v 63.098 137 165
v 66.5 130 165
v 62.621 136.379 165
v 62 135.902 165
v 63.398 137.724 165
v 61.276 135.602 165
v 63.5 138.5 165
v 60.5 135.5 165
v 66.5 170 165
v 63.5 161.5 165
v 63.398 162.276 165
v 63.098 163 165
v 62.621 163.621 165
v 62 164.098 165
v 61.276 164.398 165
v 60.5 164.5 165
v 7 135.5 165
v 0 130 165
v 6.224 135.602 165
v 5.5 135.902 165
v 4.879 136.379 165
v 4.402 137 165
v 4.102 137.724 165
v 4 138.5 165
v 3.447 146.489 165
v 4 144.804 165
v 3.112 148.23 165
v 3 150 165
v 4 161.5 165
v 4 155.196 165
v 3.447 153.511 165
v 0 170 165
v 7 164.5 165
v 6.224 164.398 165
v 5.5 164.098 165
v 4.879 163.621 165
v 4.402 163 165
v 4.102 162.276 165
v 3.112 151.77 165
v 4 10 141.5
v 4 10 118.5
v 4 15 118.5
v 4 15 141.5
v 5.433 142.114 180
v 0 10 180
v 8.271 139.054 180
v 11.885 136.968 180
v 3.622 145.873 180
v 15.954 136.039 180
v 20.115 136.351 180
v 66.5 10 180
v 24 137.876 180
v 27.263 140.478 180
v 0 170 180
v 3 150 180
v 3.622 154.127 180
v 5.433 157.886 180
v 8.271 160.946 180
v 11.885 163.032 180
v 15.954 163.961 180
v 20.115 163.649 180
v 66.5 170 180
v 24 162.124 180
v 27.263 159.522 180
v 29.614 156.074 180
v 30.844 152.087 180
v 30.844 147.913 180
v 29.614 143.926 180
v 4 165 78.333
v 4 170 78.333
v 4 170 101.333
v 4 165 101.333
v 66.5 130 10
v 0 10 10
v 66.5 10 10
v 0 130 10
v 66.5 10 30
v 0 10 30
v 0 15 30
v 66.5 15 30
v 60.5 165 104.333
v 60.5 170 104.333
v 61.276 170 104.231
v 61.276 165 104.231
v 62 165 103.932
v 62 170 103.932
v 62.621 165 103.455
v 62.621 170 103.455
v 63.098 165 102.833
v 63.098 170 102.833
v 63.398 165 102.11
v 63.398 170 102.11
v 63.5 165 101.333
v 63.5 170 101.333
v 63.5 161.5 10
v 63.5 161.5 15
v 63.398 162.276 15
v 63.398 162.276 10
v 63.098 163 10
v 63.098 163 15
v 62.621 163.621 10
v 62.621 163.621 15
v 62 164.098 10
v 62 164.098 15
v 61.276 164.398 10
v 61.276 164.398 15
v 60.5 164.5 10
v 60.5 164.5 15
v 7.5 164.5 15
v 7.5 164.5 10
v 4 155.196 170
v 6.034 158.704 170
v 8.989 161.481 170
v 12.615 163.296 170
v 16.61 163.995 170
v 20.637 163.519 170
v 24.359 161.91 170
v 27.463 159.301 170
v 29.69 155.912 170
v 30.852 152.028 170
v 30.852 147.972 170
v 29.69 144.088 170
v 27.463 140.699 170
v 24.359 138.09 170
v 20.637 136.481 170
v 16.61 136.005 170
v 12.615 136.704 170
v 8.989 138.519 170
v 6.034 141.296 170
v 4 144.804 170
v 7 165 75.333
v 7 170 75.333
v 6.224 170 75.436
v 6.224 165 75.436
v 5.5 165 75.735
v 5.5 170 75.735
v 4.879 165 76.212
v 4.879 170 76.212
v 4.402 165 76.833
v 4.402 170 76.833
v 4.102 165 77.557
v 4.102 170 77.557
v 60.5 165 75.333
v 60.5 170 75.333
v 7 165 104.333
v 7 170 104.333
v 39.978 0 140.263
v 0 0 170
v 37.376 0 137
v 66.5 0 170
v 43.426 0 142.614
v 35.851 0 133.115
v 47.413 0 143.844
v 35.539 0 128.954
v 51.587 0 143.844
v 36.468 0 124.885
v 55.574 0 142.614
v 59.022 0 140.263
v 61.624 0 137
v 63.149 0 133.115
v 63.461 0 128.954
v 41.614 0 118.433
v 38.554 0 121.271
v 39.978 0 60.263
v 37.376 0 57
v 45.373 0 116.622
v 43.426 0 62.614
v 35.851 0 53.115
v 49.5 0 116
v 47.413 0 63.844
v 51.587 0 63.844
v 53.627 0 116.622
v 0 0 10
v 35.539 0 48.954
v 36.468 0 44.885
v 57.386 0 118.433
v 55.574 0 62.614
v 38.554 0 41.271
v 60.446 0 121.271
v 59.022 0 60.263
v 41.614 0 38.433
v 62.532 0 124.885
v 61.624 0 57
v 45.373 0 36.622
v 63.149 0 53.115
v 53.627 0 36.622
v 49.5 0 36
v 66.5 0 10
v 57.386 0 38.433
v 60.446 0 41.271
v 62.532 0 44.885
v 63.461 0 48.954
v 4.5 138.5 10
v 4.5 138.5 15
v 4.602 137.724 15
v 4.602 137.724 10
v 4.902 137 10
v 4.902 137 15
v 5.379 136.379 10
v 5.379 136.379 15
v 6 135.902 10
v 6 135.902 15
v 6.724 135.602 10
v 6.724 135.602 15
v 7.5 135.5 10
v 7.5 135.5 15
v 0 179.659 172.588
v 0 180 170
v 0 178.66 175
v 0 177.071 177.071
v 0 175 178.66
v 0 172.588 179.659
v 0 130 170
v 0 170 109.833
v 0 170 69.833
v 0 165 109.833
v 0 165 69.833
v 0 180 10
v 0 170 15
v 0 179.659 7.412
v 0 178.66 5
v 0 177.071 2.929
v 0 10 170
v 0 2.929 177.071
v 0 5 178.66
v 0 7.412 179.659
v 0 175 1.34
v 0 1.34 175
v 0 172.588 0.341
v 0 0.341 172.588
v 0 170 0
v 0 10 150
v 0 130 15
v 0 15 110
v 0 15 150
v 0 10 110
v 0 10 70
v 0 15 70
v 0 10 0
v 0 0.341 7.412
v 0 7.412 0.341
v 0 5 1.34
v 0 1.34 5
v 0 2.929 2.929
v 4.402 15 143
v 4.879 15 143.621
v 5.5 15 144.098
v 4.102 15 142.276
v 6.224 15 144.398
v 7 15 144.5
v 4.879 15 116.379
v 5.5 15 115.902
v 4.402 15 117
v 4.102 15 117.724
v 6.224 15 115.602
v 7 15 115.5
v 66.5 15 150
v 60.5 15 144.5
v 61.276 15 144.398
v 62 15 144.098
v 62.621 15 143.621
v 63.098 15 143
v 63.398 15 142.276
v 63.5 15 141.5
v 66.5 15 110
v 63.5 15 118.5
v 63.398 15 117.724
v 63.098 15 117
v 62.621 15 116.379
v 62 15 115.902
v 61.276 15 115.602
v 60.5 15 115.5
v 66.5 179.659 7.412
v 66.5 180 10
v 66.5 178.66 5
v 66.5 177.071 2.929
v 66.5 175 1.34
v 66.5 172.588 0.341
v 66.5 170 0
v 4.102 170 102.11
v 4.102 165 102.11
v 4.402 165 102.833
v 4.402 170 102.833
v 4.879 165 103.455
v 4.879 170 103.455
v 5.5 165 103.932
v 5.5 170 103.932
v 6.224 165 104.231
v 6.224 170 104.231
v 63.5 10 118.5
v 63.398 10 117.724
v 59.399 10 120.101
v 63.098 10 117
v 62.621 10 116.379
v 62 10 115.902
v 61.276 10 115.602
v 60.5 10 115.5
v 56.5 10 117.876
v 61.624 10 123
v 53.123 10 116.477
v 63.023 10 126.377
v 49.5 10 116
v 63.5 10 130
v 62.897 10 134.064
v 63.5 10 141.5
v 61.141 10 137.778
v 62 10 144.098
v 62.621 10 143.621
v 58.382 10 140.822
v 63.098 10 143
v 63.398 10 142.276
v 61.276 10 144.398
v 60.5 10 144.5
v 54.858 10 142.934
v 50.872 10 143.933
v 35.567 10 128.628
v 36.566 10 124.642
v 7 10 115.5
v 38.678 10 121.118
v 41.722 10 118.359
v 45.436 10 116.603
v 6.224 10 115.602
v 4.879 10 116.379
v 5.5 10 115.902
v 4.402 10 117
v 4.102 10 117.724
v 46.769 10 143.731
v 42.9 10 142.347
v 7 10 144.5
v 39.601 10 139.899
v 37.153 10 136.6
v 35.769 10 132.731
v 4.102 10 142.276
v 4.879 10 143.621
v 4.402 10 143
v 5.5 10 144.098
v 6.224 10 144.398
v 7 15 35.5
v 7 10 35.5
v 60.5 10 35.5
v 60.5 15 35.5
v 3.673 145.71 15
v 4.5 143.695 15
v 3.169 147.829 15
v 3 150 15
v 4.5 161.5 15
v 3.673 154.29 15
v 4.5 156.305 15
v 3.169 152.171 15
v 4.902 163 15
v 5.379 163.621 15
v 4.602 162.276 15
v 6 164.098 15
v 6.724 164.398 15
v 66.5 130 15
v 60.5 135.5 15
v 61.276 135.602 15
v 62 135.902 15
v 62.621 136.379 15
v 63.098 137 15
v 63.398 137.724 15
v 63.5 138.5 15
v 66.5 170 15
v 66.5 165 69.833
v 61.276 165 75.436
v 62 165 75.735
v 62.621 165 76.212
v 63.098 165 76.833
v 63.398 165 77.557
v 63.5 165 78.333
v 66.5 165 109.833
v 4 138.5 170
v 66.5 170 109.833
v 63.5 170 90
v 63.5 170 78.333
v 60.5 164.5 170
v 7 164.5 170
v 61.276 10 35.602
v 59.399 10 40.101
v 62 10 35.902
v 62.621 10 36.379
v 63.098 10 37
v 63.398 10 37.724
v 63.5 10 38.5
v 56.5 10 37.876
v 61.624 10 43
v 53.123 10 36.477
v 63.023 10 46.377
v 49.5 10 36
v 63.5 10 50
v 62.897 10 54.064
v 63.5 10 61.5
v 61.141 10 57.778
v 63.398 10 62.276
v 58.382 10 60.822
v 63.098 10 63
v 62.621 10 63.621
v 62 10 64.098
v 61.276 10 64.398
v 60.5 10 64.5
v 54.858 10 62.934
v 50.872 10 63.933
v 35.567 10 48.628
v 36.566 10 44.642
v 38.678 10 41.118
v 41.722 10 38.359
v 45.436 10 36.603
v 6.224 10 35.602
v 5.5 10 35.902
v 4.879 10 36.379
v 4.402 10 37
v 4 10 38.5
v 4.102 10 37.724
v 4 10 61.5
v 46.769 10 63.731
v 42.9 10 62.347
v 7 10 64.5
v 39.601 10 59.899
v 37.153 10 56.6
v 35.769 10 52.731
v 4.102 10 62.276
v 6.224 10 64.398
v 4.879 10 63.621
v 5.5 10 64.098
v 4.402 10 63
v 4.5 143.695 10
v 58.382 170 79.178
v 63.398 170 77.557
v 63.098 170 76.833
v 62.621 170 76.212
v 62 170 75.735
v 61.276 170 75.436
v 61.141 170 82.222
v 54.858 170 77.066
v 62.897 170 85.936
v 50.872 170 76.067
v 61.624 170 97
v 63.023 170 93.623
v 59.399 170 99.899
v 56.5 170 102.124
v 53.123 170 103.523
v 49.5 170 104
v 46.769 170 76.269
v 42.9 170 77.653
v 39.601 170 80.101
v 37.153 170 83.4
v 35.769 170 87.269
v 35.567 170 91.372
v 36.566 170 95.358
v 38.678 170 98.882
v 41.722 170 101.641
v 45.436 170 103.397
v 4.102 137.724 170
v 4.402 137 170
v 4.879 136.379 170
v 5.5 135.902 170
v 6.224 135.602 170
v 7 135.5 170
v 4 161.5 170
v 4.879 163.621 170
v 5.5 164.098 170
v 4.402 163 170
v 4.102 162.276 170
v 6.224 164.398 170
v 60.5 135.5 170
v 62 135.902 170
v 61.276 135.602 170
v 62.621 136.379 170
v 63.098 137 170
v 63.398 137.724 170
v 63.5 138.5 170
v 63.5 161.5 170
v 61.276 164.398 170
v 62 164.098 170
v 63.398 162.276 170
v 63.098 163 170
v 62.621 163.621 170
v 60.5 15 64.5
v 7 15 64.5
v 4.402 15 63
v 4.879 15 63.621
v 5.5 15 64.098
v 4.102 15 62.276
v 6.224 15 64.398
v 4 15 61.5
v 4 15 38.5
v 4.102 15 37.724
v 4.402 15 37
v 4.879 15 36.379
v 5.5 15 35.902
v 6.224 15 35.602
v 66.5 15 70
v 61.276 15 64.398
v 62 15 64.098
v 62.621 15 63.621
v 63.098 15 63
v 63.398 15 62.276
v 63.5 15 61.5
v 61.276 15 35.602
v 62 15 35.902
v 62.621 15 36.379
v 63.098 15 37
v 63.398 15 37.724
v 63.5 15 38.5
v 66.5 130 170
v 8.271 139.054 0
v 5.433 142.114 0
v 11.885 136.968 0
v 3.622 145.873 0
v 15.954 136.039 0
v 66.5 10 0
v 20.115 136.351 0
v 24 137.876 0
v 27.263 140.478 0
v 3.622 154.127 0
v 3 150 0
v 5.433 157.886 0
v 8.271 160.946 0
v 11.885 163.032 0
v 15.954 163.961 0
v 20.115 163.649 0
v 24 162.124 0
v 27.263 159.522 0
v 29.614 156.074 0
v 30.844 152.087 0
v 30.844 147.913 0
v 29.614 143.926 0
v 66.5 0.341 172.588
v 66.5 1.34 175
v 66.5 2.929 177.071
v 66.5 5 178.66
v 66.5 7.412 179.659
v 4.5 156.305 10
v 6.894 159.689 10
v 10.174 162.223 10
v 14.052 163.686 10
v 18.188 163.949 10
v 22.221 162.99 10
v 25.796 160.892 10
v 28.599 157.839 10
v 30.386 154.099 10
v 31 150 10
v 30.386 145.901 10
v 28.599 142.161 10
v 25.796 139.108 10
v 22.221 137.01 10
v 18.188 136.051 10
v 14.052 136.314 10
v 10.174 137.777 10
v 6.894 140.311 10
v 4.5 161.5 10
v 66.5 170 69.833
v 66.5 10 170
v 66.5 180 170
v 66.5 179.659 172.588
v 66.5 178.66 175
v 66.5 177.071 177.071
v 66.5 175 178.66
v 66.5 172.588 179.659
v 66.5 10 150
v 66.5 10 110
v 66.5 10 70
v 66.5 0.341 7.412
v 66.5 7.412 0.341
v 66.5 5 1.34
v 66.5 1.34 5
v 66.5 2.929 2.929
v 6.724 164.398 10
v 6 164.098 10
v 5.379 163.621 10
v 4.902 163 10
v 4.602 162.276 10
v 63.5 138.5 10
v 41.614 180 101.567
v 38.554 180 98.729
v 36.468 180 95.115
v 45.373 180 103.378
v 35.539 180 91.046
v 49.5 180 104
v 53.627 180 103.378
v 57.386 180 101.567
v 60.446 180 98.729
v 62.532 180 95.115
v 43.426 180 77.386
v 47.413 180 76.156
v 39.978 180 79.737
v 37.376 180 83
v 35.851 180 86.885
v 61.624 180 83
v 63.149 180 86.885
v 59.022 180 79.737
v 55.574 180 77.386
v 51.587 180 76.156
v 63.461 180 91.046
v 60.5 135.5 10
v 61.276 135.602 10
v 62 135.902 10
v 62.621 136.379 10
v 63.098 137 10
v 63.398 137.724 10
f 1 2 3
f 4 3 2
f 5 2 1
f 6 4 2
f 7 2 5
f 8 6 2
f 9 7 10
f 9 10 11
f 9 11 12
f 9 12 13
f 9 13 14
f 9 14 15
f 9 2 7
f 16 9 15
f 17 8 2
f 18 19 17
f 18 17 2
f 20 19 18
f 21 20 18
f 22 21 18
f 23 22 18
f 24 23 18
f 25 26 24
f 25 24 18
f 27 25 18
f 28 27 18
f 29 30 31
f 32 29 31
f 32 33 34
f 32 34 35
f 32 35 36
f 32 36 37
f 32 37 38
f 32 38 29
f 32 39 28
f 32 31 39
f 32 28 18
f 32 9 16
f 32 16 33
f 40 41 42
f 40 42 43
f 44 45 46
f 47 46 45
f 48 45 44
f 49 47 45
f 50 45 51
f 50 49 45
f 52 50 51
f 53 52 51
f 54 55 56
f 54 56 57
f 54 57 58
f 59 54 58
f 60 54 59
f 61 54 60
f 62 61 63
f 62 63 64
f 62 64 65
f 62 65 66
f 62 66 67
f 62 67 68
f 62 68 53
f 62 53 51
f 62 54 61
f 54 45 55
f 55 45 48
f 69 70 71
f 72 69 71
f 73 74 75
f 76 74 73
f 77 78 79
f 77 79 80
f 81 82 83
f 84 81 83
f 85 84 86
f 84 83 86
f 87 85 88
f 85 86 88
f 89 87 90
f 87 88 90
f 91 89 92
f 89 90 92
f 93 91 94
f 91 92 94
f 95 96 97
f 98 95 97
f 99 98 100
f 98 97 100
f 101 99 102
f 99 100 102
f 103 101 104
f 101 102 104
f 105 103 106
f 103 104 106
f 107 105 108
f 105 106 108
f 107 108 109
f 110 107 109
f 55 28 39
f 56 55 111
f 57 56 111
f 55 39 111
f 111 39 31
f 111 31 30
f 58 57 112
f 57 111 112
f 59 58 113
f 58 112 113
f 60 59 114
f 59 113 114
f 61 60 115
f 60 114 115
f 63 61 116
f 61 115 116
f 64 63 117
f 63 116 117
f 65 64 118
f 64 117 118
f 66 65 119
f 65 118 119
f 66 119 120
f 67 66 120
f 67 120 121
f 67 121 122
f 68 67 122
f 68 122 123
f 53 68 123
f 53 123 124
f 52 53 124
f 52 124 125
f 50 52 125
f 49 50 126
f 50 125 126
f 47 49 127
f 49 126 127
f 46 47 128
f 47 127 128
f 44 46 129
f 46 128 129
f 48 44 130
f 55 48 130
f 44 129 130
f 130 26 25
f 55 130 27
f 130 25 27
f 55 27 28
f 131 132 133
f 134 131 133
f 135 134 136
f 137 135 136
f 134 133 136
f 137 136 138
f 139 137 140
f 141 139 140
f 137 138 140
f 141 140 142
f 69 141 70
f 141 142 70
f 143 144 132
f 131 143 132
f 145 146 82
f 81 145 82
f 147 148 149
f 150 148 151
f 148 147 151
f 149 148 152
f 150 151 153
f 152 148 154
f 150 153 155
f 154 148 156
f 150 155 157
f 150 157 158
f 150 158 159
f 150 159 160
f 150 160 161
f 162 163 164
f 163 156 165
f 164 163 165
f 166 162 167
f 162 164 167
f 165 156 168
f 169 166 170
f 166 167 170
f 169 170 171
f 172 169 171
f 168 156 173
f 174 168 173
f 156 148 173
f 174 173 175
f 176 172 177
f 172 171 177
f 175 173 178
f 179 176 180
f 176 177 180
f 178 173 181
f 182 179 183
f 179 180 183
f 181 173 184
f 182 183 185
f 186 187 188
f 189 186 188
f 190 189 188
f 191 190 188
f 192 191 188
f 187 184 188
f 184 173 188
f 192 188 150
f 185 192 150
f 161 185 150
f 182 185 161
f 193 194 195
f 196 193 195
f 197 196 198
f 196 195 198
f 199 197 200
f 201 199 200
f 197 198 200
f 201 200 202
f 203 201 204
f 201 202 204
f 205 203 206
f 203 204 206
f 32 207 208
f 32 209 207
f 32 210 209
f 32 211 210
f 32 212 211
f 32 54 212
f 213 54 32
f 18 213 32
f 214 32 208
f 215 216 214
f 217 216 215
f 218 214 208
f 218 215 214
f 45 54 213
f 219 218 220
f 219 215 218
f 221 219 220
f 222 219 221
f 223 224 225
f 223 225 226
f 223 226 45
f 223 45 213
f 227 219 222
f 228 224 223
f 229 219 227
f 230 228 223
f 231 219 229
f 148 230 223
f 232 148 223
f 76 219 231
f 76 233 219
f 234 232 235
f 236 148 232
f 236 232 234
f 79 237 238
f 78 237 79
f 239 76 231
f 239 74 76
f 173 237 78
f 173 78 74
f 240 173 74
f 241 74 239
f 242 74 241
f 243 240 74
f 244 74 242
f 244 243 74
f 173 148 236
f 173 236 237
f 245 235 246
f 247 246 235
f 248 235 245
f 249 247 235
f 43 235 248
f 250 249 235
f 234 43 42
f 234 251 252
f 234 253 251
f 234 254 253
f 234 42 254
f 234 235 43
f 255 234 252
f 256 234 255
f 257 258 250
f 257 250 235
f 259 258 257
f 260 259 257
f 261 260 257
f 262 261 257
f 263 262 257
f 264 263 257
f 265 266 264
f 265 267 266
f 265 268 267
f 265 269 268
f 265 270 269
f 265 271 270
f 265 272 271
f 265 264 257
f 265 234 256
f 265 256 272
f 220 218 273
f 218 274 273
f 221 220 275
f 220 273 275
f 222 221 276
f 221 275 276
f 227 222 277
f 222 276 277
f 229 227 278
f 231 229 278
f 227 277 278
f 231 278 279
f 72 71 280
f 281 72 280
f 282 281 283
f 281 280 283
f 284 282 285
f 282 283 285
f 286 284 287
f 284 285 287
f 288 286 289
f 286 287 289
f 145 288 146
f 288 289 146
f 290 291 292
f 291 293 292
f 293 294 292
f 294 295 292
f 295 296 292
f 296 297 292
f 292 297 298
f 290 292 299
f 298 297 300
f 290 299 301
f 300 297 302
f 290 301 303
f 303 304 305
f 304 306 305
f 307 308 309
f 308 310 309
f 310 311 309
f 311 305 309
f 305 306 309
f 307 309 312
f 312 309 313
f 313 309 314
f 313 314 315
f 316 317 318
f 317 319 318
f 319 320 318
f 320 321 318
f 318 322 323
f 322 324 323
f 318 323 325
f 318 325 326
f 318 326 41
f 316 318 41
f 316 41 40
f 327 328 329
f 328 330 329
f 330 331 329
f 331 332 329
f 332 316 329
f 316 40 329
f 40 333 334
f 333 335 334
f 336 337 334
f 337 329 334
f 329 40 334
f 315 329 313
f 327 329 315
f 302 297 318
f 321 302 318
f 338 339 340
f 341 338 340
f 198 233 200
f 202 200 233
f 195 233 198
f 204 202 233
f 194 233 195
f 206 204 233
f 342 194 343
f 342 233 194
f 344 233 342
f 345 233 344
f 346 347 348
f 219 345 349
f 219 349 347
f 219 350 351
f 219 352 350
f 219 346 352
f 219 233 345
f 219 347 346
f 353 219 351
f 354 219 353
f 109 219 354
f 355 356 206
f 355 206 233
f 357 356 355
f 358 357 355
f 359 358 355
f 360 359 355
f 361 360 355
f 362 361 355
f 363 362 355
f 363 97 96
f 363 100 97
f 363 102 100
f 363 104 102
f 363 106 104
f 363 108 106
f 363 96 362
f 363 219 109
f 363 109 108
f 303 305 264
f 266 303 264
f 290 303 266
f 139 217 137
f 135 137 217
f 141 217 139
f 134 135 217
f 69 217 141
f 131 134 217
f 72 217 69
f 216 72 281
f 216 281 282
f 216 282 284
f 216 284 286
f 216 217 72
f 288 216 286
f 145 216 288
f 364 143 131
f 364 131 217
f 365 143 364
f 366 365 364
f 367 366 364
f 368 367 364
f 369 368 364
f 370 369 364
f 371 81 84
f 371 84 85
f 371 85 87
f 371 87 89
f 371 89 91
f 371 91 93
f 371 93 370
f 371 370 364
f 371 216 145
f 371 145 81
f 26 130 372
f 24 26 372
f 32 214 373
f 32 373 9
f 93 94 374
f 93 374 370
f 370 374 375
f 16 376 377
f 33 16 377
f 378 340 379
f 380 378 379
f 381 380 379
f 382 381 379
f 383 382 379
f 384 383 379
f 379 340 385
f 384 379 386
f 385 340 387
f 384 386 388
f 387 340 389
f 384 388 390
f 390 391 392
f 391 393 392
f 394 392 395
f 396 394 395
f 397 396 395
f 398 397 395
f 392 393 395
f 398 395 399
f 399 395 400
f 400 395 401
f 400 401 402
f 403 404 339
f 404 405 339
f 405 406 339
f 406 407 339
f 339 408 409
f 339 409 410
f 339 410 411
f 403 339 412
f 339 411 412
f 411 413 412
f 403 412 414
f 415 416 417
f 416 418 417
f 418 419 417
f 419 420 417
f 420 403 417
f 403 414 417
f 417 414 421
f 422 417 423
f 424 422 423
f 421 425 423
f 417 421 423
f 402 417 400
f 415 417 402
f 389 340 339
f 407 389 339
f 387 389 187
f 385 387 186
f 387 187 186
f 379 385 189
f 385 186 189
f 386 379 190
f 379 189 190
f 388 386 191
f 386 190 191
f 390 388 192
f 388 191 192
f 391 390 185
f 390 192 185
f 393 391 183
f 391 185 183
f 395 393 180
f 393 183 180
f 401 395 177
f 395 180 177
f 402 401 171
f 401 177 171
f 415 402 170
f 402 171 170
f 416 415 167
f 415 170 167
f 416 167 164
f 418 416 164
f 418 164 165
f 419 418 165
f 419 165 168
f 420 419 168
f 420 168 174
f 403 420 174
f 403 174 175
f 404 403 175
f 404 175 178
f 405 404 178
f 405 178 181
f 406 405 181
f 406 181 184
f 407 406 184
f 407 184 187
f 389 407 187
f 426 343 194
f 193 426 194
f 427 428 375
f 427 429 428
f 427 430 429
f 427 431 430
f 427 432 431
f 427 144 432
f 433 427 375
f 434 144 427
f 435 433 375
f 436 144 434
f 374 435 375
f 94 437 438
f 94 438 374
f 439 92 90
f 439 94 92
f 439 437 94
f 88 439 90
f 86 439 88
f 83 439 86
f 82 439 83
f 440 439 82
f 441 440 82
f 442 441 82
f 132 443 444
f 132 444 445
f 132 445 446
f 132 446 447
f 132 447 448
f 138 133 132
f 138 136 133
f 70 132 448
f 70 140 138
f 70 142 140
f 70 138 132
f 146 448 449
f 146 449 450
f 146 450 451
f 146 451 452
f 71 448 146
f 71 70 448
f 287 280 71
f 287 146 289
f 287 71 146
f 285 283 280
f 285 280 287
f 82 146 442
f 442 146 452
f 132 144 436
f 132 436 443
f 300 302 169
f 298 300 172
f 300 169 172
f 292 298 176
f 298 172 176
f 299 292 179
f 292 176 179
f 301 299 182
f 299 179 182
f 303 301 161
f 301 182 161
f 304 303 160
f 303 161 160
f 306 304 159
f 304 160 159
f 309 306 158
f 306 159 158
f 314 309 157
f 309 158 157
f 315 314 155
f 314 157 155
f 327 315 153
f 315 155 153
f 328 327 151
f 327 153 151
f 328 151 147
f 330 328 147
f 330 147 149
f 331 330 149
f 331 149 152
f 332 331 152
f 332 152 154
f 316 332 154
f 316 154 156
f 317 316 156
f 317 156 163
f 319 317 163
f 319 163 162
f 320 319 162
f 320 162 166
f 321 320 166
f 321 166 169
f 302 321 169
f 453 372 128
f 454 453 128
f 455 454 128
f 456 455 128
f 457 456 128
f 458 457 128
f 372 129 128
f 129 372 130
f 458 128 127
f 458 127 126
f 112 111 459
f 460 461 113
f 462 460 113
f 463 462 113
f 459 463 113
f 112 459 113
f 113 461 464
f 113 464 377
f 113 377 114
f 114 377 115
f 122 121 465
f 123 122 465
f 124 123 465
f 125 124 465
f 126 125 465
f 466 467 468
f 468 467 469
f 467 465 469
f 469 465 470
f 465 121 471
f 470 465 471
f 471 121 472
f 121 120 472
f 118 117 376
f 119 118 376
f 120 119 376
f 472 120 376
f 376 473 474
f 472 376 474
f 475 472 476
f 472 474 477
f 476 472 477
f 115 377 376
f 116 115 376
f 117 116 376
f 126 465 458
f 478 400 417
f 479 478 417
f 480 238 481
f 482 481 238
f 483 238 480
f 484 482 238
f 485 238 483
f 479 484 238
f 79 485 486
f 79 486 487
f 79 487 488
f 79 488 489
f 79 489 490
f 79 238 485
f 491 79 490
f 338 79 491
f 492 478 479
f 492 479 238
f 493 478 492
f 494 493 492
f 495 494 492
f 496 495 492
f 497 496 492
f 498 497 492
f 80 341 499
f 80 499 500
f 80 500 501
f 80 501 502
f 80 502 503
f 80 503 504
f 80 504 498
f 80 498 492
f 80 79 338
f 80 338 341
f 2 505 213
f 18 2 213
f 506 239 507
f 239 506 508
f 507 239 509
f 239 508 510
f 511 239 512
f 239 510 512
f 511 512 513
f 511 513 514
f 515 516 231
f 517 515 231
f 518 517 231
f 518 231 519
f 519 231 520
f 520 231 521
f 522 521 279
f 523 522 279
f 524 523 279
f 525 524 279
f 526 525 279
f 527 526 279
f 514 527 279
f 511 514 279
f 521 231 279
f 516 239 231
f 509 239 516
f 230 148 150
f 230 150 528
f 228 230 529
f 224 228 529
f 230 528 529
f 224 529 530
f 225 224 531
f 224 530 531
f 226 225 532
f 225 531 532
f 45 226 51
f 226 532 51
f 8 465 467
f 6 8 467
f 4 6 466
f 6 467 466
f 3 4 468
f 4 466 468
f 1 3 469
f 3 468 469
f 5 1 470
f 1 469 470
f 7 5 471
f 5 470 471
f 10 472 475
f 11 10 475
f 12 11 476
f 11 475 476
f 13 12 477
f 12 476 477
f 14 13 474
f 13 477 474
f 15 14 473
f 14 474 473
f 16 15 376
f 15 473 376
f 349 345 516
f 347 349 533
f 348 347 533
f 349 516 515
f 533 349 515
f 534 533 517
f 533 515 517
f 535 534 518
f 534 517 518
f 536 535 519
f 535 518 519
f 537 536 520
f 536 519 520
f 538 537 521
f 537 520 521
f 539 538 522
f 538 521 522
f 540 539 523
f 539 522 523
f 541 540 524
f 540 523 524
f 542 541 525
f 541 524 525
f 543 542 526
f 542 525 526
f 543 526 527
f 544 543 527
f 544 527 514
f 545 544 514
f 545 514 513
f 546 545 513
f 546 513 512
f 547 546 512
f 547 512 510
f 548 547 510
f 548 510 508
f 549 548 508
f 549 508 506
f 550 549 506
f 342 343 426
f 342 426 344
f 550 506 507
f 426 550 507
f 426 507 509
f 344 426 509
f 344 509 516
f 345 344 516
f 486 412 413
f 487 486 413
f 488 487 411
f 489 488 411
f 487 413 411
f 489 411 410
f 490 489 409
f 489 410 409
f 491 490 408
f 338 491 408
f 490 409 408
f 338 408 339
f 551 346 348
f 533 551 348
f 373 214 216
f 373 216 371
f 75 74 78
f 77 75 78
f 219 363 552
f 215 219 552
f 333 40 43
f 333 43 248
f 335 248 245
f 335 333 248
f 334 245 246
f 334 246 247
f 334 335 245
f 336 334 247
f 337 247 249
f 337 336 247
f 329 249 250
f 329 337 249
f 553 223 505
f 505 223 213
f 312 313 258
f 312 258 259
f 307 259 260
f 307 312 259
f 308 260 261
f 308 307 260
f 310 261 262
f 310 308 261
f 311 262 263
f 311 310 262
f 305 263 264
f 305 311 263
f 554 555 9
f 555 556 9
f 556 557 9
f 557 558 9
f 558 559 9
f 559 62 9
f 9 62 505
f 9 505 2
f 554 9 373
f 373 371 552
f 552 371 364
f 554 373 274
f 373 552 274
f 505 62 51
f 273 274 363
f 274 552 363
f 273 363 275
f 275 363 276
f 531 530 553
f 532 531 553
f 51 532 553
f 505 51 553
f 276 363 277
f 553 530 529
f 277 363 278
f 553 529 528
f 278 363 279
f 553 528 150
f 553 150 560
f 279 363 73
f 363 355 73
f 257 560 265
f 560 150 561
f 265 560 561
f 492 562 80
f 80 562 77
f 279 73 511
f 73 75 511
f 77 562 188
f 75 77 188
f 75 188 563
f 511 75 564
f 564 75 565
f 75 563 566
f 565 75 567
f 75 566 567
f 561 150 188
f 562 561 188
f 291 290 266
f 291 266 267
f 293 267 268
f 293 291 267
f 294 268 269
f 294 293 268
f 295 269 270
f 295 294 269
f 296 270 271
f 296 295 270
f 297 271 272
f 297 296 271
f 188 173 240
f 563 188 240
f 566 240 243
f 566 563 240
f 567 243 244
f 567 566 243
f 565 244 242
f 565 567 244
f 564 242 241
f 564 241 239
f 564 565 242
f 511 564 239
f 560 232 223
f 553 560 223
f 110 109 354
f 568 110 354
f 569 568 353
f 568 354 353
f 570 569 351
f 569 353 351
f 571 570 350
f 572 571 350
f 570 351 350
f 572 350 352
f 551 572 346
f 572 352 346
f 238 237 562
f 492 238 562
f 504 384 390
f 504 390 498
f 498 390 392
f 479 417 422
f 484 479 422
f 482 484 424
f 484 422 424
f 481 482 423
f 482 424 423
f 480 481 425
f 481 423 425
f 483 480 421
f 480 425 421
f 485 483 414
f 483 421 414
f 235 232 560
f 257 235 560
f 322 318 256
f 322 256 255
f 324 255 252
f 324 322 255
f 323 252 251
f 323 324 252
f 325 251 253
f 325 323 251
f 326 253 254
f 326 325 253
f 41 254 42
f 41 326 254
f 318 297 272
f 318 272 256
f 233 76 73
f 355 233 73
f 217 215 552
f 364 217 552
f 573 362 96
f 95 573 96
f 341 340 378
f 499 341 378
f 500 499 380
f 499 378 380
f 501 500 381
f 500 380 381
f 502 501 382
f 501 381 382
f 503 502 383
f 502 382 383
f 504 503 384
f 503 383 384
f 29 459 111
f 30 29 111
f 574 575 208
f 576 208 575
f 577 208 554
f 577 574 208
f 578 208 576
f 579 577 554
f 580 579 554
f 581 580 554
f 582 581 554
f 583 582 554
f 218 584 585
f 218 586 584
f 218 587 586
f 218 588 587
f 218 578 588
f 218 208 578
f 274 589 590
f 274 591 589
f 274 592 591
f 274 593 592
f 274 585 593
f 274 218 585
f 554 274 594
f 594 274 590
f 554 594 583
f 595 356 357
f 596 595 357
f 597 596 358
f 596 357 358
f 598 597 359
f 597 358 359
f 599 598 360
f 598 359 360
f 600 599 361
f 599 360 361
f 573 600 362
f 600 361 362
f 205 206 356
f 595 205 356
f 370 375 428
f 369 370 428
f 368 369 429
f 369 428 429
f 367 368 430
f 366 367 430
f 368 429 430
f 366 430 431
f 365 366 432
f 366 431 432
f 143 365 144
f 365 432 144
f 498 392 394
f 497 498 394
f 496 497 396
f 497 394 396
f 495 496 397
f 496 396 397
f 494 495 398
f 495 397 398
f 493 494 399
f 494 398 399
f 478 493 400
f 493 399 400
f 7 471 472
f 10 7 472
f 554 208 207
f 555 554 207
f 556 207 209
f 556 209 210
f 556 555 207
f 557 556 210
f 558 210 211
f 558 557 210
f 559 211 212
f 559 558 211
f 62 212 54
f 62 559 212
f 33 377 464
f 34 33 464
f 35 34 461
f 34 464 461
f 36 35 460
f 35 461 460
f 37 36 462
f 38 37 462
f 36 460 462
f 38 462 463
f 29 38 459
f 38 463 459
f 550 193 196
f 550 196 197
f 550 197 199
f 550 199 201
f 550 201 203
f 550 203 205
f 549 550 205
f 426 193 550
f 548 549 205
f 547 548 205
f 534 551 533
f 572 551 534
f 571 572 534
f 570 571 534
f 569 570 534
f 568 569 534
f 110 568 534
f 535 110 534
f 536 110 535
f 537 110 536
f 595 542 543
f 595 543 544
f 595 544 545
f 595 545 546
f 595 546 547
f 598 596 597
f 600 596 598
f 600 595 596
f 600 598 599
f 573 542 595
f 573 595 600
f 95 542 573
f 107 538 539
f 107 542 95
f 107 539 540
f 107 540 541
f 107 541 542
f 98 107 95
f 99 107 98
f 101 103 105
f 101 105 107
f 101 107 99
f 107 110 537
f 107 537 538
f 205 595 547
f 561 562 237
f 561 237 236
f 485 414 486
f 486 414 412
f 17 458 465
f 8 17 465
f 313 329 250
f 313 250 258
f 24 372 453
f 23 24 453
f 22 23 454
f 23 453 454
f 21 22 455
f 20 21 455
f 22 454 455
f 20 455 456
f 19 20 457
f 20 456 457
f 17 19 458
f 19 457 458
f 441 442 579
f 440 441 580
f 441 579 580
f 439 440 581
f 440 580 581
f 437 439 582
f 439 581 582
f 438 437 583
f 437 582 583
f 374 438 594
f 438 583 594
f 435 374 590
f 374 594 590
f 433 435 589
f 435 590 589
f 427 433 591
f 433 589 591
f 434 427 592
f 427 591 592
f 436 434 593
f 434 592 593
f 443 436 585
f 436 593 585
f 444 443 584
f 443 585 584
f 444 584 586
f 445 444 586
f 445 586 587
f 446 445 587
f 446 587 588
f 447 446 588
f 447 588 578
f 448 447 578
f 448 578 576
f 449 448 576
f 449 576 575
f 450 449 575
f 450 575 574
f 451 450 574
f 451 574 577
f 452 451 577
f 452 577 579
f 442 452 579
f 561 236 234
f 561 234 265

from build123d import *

# Parameters (mm, degrees)
SKETCH1_W           = 66.5
SKETCH1_H           = 180
BOSS_EXTRUDE1_DEPTH = 180
SKETCH3_W           = 160
SKETCH3_H           = 160
CUT_EXTRUDE1_DEPTH  = 180
SKETCH8_W           = 66.5
SKETCH8_H           = 40
BOSS_EXTRUDE2_DEPTH = 5
SKETCH10_W          = 66.5
SKETCH10_H          = 40
BOSS_EXTRUDE3_DEPTH = 5
SKETCH5_R           = 14
CUT_EXTRUDE3_DEPTH  = 10
SKETCH7_R           = 14
CUT_EXTRUDE4_DEPTH  = 10
CUT_EXTRUDE5_DEPTH  = 5
CUT_EXTRUDE6_START  = -5
CUT_EXTRUDE6_DEPTH  = 5
SKETCH12_W          = 66.5
SKETCH12_H          = 40
BOSS_EXTRUDE8_DEPTH = 5
SKETCH15_R          = 14
CUT_EXTRUDE7_DEPTH  = 200
SKETCH16_W          = 66.5
SKETCH16_H          = 40
BOSS_EXTRUDE9_DEPTH = 5
FILLET1_R           = 10
FILLET2_R           = 10


with BuildPart() as part:
    # Sketch1 → Boss-Extrude1 (new body)
    with BuildSketch(Plane.XY):
        with Locations((33.25, 90)):
            Rectangle(SKETCH1_W, SKETCH1_H)
    extrude(amount=BOSS_EXTRUDE1_DEPTH)

    # Sketch3 → Cut-Extrude1 (cut)
    with BuildSketch(Plane.ZY):
        with Locations((90, 90)):
            Rectangle(SKETCH3_W, SKETCH3_H)
    extrude(amount=-CUT_EXTRUDE1_DEPTH, mode=Mode.SUBTRACT)

    # Sketch8 → Boss-Extrude2 (add)
    with BuildSketch(Plane.XY.offset(10)):
        with Locations((33.25, 150)):
            Rectangle(SKETCH8_W, SKETCH8_H)
    extrude(amount=BOSS_EXTRUDE2_DEPTH)

    # Sketch10 → Boss-Extrude3 (add)
    with BuildSketch(Plane(origin=(0, 0, 170), x_dir=(-1, 0, 0), z_dir=(0, 0, -1))):
        with Locations((-33.25, 150)):
            Rectangle(SKETCH10_W, SKETCH10_H)
    extrude(amount=BOSS_EXTRUDE3_DEPTH)

    # Sketch5 → Cut-Extrude3 (cut)
    with BuildSketch(Plane(origin=(0, 180, 0), x_dir=(1, 0, 0), z_dir=(0, 1, 0))):
        with Locations(Location((49.5, -90, 0), (0, 0, 270))):
            Circle(SKETCH5_R)
    extrude(amount=-CUT_EXTRUDE3_DEPTH, mode=Mode.SUBTRACT)

    # Sketch7 → Cut-Extrude4 (cut)
    with BuildSketch(Plane.XZ):
        with Locations(Location((49.5, 50, 0), (0, 0, 270))):
            Circle(SKETCH7_R)
        with Locations(Location((49.5, 130, 0), (0, 0, 270))):
            Circle(SKETCH7_R)
    extrude(amount=-CUT_EXTRUDE4_DEPTH, mode=Mode.SUBTRACT)

    # Sketch9 → Cut-Extrude5 (cut)
    with BuildSketch(Plane.XY.offset(15)):
        with BuildLine():
            Line((60.5, 164.5), (7.5, 164.5))
            ThreePointArc((7.5, 164.5), (5.378679656, 163.621320344), (4.5, 161.5))
            Line((4.5, 161.5), (4.5, 138.5))
            ThreePointArc((4.5, 138.5), (5.378679656, 136.378679656), (7.5, 135.5))
            Line((7.5, 135.5), (60.5, 135.5))
            ThreePointArc((60.5, 135.5), (62.621320344, 136.378679656), (63.5, 138.5))
            Line((63.5, 138.5), (63.5, 161.5))
            ThreePointArc((63.5, 161.5), (62.621320344, 163.621320344), (60.5, 164.5))
        make_face()
    extrude(amount=-CUT_EXTRUDE5_DEPTH, mode=Mode.SUBTRACT)

    # Sketch11 → Cut-Extrude6 (cut)
    with BuildSketch(Plane(origin=(0, 0, 165), x_dir=(-1, 0, 0), z_dir=(0, 0, -1)).offset(CUT_EXTRUDE6_START)):
        with BuildLine():
            Line((-60.5, 164.5), (-7, 164.5))
            ThreePointArc((-7, 164.5), (-4.878679656, 163.621320344), (-4, 161.5))
            Line((-4, 161.5), (-4, 138.5))
            ThreePointArc((-4, 138.5), (-4.878679656, 136.378679656), (-7, 135.5))
            Line((-7, 135.5), (-60.5, 135.5))
            ThreePointArc((-60.5, 135.5), (-62.621320344, 136.378679656), (-63.5, 138.5))
            Line((-63.5, 138.5), (-63.5, 161.5))
            ThreePointArc((-63.5, 161.5), (-62.621320344, 163.621320344), (-60.5, 164.5))
        make_face()
    extrude(amount=CUT_EXTRUDE6_DEPTH, mode=Mode.SUBTRACT)

    # Sketch12 → Boss-Extrude8 (add)
    with BuildSketch(Plane.XZ.offset(-170)):
        with Locations((33.25, 89.833476808)):
            Rectangle(SKETCH12_W, SKETCH12_H)
        with BuildLine():
            Line((60.5, 75.333476808), (7, 75.333476808))
            ThreePointArc((7, 75.333476808), (4.878679656, 76.212156465), (4, 78.333476808))
            Line((4, 78.333476808), (4, 101.333476808))
            ThreePointArc((4, 101.333476808), (4.878679656, 103.454797152), (7, 104.333476808))
            Line((7, 104.333476808), (60.5, 104.333476808))
            ThreePointArc((60.5, 104.333476808), (62.621320344, 103.454797152), (63.5, 101.333476808))
            Line((63.5, 101.333476808), (63.5, 78.333476808))
            ThreePointArc((63.5, 78.333476808), (62.621320344, 76.212156465), (60.5, 75.333476808))
        make_face(mode=Mode.SUBTRACT)
    extrude(amount=BOSS_EXTRUDE8_DEPTH)

    # Sketch15 → Cut-Extrude7 (cut)
    with BuildSketch(Plane(origin=(0, 0, 0), x_dir=(-1, 0, 0), z_dir=(0, 0, -1))):
        with Locations((-17, 150)):
            Circle(SKETCH15_R)
    extrude(amount=-CUT_EXTRUDE7_DEPTH, mode=Mode.SUBTRACT)

    # Sketch16 → Boss-Extrude9 (add)
    # profile 1 of 2: a face of its own
    with BuildSketch(Plane(origin=(0, 10, 0), x_dir=(1, 0, 0), z_dir=(0, 1, 0))):
        with Locations((33.25, -50)):
            Rectangle(SKETCH16_W, SKETCH16_H)
        with BuildLine():
            Line((63.5, -38.5), (63.5, -61.5))
            ThreePointArc((63.5, -61.5), (62.621320344, -63.621320344), (60.5, -64.5))
            Line((60.5, -64.5), (7, -64.5))
            ThreePointArc((7, -64.5), (4.878679656, -63.621320344), (4, -61.5))
            Line((4, -61.5), (4, -38.5))
            ThreePointArc((4, -38.5), (4.878679656, -36.378679656), (7, -35.5))
            Line((7, -35.5), (60.5, -35.5))
            ThreePointArc((60.5, -35.5), (62.621320344, -36.378679656), (63.5, -38.5))
        make_face(mode=Mode.SUBTRACT)
    # profile 2 of 2: a face of its own
    with BuildSketch(Plane(origin=(0, 10, 0), x_dir=(1, 0, 0), z_dir=(0, 1, 0))):
        with Locations((33.25, -130)):
            Rectangle(SKETCH16_W, SKETCH16_H)
        with BuildLine():
            Line((63.5, -141.5), (63.5, -118.5))
            ThreePointArc((63.5, -118.5), (62.621320344, -116.378679656), (60.5, -115.5))
            Line((60.5, -115.5), (7, -115.5))
            ThreePointArc((7, -115.5), (4.878679656, -116.378679656), (4, -118.5))
            Line((4, -118.5), (4, -141.5))
            ThreePointArc((4, -141.5), (4.878679656, -143.621320344), (7, -144.5))
            Line((7, -144.5), (60.5, -144.5))
            ThreePointArc((60.5, -144.5), (62.621320344, -143.621320344), (63.5, -141.5))
        make_face(mode=Mode.SUBTRACT)
    extrude(amount=BOSS_EXTRUDE9_DEPTH)

    # Fillet1
    fillet1_edges = [part.edges().sort_by_distance(p)[0] for p in [
        (33.25, 180, 0),
        (33.25, 0, 0),
    ]]
    fillet(fillet1_edges, radius=FILLET1_R)

    # Fillet2
    fillet2_edges = [part.edges().sort_by_distance(p)[0] for p in [
        (33.25, 180, 180),
        (33.25, 0, 180),
    ]]
    fillet(fillet2_edges, radius=FILLET2_R)


solid = part.part
